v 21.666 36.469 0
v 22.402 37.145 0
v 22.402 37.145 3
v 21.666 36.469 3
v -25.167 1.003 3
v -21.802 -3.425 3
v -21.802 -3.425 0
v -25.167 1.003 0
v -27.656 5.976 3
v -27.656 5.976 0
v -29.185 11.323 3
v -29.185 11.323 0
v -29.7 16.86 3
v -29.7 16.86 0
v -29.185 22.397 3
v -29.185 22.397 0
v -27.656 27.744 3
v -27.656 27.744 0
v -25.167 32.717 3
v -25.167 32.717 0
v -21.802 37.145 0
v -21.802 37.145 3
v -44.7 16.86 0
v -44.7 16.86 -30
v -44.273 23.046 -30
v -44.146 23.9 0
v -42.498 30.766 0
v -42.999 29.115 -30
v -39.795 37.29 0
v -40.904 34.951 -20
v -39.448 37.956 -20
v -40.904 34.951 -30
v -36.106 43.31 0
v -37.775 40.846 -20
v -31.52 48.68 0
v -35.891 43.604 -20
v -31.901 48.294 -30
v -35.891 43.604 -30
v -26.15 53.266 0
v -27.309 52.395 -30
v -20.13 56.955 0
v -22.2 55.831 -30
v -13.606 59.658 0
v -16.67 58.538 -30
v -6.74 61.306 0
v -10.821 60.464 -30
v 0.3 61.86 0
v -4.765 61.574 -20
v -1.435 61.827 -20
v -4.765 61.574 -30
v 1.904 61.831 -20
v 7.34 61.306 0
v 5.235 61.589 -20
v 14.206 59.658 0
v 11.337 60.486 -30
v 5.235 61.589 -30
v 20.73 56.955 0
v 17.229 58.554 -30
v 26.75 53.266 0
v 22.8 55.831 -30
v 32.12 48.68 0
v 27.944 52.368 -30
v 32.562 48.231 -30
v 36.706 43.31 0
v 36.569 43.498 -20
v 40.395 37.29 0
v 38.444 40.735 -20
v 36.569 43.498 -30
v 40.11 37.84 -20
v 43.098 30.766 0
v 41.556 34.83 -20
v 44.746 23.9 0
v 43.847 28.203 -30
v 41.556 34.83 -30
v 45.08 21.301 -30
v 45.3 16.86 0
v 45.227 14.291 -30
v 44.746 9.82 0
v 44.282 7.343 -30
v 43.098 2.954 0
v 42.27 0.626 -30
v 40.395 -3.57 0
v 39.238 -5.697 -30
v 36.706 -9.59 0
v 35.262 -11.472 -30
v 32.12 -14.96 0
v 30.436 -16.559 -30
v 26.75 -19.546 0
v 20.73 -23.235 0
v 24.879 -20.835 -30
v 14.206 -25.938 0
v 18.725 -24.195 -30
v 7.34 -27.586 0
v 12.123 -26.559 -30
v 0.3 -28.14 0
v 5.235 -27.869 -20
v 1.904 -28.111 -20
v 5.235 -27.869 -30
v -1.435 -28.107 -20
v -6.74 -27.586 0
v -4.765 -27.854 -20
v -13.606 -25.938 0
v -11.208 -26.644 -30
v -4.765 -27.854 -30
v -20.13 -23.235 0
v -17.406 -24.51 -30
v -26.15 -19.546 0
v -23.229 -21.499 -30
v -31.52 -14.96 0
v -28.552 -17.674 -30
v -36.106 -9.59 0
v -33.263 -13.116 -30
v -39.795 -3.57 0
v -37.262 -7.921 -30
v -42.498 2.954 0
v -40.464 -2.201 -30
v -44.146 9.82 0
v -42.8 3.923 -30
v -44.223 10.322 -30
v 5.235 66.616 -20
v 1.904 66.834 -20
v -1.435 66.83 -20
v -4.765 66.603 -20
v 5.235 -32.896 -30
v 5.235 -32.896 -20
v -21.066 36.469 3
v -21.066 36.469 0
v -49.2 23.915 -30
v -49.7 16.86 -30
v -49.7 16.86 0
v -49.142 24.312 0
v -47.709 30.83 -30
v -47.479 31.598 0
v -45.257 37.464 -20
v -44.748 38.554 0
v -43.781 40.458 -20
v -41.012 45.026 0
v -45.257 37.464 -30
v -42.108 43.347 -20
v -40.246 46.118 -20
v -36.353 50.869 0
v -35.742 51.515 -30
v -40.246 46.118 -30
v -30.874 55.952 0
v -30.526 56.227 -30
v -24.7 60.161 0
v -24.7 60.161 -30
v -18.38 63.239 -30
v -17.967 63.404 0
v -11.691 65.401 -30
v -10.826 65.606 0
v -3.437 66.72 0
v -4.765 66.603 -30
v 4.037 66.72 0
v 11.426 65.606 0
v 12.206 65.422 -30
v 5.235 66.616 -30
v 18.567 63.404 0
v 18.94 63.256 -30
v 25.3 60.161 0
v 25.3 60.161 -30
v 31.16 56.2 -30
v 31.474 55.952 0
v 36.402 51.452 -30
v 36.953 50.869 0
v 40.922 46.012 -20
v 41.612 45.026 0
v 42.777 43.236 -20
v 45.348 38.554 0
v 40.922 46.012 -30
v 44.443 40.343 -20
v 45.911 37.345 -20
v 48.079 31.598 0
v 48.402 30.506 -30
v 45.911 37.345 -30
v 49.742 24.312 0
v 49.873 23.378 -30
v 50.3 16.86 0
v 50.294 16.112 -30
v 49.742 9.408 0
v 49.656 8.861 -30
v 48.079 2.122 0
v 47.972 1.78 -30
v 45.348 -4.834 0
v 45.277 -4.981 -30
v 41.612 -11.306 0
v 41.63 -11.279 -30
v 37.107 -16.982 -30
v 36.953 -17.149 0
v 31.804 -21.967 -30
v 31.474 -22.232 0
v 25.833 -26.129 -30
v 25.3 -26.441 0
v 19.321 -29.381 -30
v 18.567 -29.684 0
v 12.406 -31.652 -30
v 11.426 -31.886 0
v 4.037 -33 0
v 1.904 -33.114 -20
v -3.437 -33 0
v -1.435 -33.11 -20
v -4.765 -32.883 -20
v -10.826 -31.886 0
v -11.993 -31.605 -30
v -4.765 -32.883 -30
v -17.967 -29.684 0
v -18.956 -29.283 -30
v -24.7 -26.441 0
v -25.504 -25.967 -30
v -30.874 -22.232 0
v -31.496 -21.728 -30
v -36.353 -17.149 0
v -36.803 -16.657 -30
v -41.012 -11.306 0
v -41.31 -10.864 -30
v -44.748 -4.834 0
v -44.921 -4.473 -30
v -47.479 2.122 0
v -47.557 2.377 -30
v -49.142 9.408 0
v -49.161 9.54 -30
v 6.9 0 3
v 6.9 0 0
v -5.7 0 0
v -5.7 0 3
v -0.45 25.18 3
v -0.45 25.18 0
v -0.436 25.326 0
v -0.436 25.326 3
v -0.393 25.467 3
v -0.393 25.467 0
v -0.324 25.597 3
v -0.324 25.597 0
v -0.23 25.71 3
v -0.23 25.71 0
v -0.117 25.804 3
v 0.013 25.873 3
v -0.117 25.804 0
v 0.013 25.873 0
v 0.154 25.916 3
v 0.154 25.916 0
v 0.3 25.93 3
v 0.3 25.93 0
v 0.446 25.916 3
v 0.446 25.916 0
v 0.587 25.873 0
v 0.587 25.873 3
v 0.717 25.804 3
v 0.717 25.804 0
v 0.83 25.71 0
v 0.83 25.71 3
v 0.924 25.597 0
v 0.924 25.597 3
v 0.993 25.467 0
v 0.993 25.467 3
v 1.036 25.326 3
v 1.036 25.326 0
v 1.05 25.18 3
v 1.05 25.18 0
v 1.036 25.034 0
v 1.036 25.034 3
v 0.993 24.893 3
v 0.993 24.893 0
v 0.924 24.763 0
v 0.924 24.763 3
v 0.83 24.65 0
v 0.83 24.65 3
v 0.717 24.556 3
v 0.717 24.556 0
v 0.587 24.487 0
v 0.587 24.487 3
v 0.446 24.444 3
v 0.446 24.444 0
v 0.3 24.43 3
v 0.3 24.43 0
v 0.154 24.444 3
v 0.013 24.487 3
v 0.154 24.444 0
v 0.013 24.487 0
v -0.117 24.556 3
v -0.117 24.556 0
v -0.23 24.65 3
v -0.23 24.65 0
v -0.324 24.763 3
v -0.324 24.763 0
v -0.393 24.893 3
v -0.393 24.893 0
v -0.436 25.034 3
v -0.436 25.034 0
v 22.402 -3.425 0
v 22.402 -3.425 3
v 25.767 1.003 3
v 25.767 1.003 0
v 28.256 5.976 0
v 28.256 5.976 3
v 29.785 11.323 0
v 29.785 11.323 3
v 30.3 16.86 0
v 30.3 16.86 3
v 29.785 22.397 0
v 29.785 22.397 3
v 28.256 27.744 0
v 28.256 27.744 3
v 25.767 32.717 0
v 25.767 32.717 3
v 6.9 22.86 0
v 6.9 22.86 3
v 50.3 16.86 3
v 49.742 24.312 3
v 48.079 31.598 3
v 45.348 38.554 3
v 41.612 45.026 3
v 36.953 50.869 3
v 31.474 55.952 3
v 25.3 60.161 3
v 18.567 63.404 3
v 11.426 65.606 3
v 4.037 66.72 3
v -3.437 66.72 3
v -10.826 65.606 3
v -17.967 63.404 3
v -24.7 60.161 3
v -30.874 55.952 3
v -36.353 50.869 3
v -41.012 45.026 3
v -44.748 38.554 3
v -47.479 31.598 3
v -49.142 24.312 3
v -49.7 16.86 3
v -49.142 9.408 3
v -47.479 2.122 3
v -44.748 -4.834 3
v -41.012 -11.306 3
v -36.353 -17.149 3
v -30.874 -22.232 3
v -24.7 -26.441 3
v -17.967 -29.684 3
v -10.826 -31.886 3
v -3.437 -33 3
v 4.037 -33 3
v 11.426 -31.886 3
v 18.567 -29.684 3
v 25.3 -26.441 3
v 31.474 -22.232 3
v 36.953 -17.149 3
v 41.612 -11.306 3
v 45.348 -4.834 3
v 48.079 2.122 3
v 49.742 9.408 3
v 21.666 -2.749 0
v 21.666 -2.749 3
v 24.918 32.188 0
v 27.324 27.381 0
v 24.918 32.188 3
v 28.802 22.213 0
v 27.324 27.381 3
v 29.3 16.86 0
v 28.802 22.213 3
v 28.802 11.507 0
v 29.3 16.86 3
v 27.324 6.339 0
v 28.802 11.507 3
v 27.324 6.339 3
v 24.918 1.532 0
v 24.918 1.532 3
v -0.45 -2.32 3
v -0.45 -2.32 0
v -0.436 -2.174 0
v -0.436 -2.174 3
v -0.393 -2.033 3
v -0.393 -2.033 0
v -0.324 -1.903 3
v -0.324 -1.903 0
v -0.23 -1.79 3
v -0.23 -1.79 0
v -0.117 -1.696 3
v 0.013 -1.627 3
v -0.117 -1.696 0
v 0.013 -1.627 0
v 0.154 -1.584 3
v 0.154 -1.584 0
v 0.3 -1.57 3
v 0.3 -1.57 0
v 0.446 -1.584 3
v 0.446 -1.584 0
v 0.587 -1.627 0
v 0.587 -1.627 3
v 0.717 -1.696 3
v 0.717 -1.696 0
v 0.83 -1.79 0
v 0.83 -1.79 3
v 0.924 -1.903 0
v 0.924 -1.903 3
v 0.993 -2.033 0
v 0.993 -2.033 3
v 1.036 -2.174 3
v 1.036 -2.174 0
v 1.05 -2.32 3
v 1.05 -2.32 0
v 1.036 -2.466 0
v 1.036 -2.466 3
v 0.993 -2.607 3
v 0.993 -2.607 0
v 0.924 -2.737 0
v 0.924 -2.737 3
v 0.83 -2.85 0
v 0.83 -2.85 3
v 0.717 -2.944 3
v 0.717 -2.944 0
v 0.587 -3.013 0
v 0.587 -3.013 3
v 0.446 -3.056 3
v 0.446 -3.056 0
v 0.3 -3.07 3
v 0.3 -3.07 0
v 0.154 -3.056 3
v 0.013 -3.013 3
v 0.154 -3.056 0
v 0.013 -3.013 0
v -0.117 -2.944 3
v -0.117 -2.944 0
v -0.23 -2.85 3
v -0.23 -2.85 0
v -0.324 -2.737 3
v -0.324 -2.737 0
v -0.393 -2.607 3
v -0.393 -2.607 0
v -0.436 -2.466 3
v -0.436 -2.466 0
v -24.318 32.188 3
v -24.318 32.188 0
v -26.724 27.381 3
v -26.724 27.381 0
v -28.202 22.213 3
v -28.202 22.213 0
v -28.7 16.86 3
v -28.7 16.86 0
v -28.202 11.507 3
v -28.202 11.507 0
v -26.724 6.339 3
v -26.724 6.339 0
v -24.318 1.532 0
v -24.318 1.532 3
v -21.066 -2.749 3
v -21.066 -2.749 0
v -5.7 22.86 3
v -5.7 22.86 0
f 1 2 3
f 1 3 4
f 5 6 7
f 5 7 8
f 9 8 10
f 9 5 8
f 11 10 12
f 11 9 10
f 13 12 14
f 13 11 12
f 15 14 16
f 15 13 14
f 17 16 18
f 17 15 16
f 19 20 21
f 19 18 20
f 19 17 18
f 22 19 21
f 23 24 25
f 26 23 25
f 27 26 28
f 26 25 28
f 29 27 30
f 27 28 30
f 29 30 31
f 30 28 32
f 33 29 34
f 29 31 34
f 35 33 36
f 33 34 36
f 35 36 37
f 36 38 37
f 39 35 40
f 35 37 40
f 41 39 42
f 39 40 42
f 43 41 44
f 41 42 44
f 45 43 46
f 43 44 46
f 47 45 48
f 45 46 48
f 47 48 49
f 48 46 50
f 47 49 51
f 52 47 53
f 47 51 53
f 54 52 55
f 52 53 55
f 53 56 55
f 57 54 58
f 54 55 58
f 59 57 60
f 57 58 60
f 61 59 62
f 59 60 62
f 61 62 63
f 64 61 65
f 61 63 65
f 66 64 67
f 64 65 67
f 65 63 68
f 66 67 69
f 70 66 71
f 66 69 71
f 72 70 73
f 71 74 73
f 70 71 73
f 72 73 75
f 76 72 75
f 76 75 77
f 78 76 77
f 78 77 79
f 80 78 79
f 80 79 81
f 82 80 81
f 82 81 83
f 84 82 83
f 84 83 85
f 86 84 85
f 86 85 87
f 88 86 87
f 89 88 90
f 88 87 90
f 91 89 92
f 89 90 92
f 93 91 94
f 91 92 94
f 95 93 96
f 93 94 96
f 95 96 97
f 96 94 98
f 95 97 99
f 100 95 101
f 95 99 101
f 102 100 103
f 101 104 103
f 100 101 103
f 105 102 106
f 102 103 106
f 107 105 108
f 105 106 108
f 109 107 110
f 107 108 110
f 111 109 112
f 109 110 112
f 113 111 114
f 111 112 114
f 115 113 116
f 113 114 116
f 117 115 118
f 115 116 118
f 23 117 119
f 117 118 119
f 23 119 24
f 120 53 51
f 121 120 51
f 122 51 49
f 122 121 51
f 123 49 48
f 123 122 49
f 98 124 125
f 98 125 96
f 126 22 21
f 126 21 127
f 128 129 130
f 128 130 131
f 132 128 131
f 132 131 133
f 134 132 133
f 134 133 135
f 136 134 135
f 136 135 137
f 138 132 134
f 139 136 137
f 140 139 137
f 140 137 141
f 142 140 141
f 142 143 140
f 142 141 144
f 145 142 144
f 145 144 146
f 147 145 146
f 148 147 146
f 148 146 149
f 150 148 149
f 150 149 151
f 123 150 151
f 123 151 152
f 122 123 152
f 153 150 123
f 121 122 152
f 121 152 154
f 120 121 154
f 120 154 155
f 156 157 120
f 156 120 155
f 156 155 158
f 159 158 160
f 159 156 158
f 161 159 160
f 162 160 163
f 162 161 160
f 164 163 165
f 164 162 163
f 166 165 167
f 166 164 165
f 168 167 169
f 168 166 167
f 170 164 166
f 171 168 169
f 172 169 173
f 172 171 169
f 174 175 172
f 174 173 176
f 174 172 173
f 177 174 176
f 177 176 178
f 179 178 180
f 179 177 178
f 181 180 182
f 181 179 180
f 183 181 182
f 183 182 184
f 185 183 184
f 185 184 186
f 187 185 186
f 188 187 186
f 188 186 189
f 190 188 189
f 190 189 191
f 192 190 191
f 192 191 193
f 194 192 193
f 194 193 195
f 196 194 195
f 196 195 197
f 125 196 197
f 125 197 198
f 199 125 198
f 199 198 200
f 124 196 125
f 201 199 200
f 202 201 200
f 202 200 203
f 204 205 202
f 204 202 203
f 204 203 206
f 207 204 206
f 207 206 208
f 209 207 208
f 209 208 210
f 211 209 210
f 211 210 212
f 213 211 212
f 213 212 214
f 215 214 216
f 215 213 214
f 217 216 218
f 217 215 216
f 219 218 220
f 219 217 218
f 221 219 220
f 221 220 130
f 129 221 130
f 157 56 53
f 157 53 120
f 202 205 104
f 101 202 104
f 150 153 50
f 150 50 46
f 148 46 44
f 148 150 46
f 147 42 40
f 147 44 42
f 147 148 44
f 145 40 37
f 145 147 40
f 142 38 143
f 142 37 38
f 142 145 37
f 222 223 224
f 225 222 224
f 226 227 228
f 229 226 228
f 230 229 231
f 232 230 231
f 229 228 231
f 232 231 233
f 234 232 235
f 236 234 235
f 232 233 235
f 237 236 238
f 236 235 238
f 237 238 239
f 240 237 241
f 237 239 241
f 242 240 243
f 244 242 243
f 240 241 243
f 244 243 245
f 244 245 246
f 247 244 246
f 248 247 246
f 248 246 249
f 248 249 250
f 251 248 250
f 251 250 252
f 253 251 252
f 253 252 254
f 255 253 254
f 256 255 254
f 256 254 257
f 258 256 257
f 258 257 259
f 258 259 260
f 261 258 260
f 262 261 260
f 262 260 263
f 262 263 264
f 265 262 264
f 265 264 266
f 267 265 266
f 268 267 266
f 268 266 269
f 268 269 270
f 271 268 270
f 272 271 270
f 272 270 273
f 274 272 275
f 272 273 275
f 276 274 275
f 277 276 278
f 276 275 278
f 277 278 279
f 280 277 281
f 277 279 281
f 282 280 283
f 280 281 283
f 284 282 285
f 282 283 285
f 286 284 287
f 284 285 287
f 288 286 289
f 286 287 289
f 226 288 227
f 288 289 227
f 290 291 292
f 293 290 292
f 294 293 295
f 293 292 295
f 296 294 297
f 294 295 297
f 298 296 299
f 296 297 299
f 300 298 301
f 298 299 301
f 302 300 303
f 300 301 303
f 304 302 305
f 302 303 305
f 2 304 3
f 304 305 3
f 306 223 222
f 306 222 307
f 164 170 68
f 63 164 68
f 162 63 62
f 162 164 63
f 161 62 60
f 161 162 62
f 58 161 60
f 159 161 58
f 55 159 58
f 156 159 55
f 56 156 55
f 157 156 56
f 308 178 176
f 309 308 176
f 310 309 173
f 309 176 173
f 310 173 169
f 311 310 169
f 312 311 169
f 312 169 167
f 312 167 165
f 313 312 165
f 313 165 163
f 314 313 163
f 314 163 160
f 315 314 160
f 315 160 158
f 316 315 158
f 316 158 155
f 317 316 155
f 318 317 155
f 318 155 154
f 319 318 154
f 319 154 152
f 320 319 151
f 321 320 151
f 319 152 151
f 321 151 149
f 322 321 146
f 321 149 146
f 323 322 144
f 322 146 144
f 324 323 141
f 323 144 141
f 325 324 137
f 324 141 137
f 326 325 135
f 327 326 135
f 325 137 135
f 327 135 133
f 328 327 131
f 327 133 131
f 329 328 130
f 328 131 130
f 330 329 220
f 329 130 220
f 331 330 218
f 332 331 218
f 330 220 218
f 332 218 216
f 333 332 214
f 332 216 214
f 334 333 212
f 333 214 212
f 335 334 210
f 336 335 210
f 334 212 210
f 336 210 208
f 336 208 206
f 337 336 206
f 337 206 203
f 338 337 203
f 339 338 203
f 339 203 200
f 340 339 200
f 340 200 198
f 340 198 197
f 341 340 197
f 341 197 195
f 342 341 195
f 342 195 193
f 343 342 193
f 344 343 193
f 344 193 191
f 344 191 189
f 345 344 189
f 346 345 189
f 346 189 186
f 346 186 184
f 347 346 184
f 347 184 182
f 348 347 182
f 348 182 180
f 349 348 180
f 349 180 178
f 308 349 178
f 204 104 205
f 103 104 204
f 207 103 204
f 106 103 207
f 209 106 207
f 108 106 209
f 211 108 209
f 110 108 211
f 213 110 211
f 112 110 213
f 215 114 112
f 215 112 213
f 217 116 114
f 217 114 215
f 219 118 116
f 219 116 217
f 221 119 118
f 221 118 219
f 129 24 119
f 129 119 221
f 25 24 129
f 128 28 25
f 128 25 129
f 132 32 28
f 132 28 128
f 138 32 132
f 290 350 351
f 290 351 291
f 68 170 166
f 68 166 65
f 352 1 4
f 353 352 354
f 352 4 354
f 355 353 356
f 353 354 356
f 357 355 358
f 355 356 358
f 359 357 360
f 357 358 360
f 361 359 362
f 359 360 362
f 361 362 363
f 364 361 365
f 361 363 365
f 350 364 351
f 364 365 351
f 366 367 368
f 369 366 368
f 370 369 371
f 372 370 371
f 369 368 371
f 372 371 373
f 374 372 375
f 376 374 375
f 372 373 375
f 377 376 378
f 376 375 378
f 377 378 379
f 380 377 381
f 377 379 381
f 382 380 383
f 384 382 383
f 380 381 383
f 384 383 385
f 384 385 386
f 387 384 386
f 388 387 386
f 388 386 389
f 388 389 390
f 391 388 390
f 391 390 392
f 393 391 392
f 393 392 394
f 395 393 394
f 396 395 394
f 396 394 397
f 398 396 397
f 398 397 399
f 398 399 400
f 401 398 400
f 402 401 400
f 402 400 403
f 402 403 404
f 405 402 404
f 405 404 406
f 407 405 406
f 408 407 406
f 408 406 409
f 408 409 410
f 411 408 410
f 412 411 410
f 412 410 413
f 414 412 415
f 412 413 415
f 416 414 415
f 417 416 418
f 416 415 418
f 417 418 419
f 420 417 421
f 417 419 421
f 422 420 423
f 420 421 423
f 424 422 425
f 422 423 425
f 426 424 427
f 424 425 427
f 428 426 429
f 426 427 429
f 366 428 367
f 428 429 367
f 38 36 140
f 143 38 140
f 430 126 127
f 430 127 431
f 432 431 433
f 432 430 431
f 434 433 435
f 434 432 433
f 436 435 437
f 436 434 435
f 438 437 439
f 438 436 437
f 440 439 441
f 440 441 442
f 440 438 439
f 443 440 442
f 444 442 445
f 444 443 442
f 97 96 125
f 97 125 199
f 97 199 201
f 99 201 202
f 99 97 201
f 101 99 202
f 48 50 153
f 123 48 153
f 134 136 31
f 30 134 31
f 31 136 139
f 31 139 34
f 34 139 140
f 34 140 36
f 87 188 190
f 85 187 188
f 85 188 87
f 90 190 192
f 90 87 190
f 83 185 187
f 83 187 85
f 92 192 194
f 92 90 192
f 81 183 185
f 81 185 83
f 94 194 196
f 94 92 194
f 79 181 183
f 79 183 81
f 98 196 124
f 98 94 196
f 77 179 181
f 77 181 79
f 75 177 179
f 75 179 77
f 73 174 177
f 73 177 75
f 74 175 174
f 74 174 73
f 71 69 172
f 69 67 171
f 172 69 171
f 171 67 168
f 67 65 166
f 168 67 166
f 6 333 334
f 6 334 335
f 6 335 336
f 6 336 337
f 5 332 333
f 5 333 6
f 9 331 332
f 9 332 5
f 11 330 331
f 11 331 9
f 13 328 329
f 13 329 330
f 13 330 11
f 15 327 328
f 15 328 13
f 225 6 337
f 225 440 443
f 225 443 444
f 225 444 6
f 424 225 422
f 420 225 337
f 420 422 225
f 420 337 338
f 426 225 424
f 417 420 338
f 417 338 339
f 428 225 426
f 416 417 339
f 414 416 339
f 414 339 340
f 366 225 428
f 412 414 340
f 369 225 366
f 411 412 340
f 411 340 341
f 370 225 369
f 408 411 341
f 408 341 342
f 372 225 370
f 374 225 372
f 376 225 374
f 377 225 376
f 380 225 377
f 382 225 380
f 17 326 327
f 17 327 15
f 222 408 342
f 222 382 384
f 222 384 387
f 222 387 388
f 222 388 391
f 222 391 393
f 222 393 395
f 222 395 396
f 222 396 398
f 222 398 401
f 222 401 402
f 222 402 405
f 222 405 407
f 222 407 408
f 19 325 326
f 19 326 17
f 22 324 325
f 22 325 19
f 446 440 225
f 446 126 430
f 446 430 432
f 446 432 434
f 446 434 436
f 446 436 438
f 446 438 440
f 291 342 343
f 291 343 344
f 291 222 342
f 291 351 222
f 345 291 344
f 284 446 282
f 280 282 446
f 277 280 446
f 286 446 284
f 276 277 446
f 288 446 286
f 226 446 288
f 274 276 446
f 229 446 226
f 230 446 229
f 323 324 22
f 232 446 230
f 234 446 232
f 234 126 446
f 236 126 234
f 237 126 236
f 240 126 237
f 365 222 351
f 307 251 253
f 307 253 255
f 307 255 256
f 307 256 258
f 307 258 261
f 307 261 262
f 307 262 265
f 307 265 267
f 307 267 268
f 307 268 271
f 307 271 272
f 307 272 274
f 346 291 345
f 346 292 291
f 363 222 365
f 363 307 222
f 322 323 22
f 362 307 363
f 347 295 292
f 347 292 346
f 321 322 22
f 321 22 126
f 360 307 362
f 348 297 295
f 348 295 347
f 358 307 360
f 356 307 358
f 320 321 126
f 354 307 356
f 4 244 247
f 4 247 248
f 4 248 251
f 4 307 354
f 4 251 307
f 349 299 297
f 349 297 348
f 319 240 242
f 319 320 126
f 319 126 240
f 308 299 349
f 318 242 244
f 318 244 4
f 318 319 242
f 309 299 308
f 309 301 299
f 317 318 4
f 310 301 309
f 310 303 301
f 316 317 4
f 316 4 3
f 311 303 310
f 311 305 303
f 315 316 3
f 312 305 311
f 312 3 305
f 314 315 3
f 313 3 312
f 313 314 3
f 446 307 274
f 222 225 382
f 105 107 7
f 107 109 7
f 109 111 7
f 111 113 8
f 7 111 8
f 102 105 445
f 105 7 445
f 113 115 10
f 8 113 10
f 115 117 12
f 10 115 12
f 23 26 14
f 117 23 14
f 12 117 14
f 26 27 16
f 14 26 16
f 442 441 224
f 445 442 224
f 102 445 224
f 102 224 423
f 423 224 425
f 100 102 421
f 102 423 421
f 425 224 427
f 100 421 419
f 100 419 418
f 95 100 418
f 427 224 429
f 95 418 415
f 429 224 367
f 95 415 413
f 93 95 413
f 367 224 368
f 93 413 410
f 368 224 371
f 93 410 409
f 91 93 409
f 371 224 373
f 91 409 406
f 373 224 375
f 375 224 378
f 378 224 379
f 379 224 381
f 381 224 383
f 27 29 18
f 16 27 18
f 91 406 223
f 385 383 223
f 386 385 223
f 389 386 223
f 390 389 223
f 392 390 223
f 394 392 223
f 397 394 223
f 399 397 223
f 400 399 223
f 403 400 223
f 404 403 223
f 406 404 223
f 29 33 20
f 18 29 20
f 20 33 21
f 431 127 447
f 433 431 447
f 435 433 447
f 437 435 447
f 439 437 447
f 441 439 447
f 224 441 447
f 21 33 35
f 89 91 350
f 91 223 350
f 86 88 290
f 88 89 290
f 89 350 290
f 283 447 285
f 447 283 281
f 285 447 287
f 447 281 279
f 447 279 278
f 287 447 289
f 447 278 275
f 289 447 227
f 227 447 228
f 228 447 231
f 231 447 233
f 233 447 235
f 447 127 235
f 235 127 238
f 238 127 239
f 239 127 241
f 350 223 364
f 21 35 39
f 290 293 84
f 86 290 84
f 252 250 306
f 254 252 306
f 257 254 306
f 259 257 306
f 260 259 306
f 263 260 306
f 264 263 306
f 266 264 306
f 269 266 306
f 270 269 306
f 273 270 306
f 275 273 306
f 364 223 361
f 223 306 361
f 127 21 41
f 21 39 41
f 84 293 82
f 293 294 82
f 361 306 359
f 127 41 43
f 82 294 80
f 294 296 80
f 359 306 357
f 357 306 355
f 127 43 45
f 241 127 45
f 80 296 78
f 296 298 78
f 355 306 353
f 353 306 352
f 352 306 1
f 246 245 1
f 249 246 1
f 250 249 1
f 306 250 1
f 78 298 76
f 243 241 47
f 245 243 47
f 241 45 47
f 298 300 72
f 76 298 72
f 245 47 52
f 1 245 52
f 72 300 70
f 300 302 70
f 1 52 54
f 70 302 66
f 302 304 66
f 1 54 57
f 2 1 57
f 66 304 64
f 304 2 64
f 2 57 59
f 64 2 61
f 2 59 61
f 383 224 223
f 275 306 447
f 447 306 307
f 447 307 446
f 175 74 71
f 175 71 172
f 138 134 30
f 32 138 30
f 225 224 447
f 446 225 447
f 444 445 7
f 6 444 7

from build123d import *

# Parameters (mm, degrees)
SKETCH1_R           = 50
BOSS_EXTRUDE2_DEPTH = 3
BOSS_EXTRUDE3_START = 30
SKETCH4_R           = 50
SKETCH4_R_2         = 45
BOSS_EXTRUDE3_DEPTH = 30
SKETCH6_W           = 10
SKETCH6_H           = 13.969019588
SKETCH6_H_2         = 16.825930606
CUT_EXTRUDE5_DEPTH  = 10
SKETCH2_R           = 0.75
SKETCH2_W           = 12.6
SKETCH2_H           = 22.86
CUT_EXTRUDE6_DEPTH  = 89.883910805
CUT_EXTRUDE7_DEPTH  = 10


with BuildPart() as part:
    # Sketch1 → Boss-Extrude2 (new body)
    with BuildSketch(Plane.XY):
        with Locations((0.3, 16.86)):
            Circle(SKETCH1_R)
    extrude(amount=BOSS_EXTRUDE2_DEPTH)

    # Sketch4 → Boss-Extrude3 (add)
    with BuildSketch(Plane(origin=(0, 0, 0), x_dir=(-1, 0, 0), z_dir=(0, 0, -1)).offset(BOSS_EXTRUDE3_START)):
        with Locations((-0.3, 16.86)):
            Circle(SKETCH4_R)
        with Locations((-0.3, 16.86)):
            Circle(SKETCH4_R_2, mode=Mode.SUBTRACT)
    extrude(amount=-BOSS_EXTRUDE3_DEPTH)

    # Sketch6 → Cut-Extrude5 (cut)
    with BuildSketch(Plane(origin=(0, 0, -30), x_dir=(-1, 0, 0), z_dir=(0, 0, -1))):
        Polygon((-44.927169294, 48.323775511), (-32.829643465, 41.339265717), (-37.829643465, 32.679011679), (-49.927169294, 39.663521473), align=None)
        with Locations((-0.234844245, -30.535640269)):
            Rectangle(SKETCH6_W, SKETCH6_H)
        Polygon((49.262013539, 39.776374552), (37.164487709, 32.791864758), (32.164487709, 41.452118796), (44.262013539, 48.43662859), align=None)
        with Locations((-0.234844245, 64.462731708)):
            Rectangle(SKETCH6_W, SKETCH6_H_2)
    extrude(amount=-CUT_EXTRUDE5_DEPTH, mode=Mode.SUBTRACT)

    # Sketch2 → Cut-Extrude6 (cut, through all)
    with BuildSketch(Plane(origin=(0, 0, 0), x_dir=(-1, 0, 0), z_dir=(0, 0, -1))):
        with Locations((-0.3, -2.32)):
            Circle(SKETCH2_R)
        with Locations((-0.3, 25.18)):
            Circle(SKETCH2_R)
        with Locations((-0.6, 11.43)):
            Rectangle(SKETCH2_W, SKETCH2_H)
    extrude(amount=-CUT_EXTRUDE6_DEPTH, mode=Mode.SUBTRACT)

    # Sketch7 → Cut-Extrude7 (cut)
    with BuildSketch(Plane.XY.offset(3)):
        with BuildLine():
            Line((-21.802387412, 37.145080002), (-21.065641165, 36.468910669))
            ThreePointArc((-21.065641165, 36.468910669), (-28.7, 16.86), (-21.065641165, -2.748910669))
            Line((-21.065641165, -2.748910669), (-21.802387412, -3.425080002))
            ThreePointArc((-21.802387412, -3.425080002), (-29.7, 16.86), (-21.802387412, 37.145080002))
        make_face()
        with BuildLine():
            Line((21.665641165, -2.748910669), (22.402387412, -3.425080002))
            ThreePointArc((22.402387412, -3.425080002), (30.3, 16.86), (22.402387412, 37.145080002))
            Line((22.402387412, 37.145080002), (21.665641165, 36.468910669))
            ThreePointArc((21.665641165, 36.468910669), (29.3, 16.86), (21.665641165, -2.748910669))
        make_face()
    extrude(amount=-CUT_EXTRUDE7_DEPTH, mode=Mode.SUBTRACT)


solid = part.part
